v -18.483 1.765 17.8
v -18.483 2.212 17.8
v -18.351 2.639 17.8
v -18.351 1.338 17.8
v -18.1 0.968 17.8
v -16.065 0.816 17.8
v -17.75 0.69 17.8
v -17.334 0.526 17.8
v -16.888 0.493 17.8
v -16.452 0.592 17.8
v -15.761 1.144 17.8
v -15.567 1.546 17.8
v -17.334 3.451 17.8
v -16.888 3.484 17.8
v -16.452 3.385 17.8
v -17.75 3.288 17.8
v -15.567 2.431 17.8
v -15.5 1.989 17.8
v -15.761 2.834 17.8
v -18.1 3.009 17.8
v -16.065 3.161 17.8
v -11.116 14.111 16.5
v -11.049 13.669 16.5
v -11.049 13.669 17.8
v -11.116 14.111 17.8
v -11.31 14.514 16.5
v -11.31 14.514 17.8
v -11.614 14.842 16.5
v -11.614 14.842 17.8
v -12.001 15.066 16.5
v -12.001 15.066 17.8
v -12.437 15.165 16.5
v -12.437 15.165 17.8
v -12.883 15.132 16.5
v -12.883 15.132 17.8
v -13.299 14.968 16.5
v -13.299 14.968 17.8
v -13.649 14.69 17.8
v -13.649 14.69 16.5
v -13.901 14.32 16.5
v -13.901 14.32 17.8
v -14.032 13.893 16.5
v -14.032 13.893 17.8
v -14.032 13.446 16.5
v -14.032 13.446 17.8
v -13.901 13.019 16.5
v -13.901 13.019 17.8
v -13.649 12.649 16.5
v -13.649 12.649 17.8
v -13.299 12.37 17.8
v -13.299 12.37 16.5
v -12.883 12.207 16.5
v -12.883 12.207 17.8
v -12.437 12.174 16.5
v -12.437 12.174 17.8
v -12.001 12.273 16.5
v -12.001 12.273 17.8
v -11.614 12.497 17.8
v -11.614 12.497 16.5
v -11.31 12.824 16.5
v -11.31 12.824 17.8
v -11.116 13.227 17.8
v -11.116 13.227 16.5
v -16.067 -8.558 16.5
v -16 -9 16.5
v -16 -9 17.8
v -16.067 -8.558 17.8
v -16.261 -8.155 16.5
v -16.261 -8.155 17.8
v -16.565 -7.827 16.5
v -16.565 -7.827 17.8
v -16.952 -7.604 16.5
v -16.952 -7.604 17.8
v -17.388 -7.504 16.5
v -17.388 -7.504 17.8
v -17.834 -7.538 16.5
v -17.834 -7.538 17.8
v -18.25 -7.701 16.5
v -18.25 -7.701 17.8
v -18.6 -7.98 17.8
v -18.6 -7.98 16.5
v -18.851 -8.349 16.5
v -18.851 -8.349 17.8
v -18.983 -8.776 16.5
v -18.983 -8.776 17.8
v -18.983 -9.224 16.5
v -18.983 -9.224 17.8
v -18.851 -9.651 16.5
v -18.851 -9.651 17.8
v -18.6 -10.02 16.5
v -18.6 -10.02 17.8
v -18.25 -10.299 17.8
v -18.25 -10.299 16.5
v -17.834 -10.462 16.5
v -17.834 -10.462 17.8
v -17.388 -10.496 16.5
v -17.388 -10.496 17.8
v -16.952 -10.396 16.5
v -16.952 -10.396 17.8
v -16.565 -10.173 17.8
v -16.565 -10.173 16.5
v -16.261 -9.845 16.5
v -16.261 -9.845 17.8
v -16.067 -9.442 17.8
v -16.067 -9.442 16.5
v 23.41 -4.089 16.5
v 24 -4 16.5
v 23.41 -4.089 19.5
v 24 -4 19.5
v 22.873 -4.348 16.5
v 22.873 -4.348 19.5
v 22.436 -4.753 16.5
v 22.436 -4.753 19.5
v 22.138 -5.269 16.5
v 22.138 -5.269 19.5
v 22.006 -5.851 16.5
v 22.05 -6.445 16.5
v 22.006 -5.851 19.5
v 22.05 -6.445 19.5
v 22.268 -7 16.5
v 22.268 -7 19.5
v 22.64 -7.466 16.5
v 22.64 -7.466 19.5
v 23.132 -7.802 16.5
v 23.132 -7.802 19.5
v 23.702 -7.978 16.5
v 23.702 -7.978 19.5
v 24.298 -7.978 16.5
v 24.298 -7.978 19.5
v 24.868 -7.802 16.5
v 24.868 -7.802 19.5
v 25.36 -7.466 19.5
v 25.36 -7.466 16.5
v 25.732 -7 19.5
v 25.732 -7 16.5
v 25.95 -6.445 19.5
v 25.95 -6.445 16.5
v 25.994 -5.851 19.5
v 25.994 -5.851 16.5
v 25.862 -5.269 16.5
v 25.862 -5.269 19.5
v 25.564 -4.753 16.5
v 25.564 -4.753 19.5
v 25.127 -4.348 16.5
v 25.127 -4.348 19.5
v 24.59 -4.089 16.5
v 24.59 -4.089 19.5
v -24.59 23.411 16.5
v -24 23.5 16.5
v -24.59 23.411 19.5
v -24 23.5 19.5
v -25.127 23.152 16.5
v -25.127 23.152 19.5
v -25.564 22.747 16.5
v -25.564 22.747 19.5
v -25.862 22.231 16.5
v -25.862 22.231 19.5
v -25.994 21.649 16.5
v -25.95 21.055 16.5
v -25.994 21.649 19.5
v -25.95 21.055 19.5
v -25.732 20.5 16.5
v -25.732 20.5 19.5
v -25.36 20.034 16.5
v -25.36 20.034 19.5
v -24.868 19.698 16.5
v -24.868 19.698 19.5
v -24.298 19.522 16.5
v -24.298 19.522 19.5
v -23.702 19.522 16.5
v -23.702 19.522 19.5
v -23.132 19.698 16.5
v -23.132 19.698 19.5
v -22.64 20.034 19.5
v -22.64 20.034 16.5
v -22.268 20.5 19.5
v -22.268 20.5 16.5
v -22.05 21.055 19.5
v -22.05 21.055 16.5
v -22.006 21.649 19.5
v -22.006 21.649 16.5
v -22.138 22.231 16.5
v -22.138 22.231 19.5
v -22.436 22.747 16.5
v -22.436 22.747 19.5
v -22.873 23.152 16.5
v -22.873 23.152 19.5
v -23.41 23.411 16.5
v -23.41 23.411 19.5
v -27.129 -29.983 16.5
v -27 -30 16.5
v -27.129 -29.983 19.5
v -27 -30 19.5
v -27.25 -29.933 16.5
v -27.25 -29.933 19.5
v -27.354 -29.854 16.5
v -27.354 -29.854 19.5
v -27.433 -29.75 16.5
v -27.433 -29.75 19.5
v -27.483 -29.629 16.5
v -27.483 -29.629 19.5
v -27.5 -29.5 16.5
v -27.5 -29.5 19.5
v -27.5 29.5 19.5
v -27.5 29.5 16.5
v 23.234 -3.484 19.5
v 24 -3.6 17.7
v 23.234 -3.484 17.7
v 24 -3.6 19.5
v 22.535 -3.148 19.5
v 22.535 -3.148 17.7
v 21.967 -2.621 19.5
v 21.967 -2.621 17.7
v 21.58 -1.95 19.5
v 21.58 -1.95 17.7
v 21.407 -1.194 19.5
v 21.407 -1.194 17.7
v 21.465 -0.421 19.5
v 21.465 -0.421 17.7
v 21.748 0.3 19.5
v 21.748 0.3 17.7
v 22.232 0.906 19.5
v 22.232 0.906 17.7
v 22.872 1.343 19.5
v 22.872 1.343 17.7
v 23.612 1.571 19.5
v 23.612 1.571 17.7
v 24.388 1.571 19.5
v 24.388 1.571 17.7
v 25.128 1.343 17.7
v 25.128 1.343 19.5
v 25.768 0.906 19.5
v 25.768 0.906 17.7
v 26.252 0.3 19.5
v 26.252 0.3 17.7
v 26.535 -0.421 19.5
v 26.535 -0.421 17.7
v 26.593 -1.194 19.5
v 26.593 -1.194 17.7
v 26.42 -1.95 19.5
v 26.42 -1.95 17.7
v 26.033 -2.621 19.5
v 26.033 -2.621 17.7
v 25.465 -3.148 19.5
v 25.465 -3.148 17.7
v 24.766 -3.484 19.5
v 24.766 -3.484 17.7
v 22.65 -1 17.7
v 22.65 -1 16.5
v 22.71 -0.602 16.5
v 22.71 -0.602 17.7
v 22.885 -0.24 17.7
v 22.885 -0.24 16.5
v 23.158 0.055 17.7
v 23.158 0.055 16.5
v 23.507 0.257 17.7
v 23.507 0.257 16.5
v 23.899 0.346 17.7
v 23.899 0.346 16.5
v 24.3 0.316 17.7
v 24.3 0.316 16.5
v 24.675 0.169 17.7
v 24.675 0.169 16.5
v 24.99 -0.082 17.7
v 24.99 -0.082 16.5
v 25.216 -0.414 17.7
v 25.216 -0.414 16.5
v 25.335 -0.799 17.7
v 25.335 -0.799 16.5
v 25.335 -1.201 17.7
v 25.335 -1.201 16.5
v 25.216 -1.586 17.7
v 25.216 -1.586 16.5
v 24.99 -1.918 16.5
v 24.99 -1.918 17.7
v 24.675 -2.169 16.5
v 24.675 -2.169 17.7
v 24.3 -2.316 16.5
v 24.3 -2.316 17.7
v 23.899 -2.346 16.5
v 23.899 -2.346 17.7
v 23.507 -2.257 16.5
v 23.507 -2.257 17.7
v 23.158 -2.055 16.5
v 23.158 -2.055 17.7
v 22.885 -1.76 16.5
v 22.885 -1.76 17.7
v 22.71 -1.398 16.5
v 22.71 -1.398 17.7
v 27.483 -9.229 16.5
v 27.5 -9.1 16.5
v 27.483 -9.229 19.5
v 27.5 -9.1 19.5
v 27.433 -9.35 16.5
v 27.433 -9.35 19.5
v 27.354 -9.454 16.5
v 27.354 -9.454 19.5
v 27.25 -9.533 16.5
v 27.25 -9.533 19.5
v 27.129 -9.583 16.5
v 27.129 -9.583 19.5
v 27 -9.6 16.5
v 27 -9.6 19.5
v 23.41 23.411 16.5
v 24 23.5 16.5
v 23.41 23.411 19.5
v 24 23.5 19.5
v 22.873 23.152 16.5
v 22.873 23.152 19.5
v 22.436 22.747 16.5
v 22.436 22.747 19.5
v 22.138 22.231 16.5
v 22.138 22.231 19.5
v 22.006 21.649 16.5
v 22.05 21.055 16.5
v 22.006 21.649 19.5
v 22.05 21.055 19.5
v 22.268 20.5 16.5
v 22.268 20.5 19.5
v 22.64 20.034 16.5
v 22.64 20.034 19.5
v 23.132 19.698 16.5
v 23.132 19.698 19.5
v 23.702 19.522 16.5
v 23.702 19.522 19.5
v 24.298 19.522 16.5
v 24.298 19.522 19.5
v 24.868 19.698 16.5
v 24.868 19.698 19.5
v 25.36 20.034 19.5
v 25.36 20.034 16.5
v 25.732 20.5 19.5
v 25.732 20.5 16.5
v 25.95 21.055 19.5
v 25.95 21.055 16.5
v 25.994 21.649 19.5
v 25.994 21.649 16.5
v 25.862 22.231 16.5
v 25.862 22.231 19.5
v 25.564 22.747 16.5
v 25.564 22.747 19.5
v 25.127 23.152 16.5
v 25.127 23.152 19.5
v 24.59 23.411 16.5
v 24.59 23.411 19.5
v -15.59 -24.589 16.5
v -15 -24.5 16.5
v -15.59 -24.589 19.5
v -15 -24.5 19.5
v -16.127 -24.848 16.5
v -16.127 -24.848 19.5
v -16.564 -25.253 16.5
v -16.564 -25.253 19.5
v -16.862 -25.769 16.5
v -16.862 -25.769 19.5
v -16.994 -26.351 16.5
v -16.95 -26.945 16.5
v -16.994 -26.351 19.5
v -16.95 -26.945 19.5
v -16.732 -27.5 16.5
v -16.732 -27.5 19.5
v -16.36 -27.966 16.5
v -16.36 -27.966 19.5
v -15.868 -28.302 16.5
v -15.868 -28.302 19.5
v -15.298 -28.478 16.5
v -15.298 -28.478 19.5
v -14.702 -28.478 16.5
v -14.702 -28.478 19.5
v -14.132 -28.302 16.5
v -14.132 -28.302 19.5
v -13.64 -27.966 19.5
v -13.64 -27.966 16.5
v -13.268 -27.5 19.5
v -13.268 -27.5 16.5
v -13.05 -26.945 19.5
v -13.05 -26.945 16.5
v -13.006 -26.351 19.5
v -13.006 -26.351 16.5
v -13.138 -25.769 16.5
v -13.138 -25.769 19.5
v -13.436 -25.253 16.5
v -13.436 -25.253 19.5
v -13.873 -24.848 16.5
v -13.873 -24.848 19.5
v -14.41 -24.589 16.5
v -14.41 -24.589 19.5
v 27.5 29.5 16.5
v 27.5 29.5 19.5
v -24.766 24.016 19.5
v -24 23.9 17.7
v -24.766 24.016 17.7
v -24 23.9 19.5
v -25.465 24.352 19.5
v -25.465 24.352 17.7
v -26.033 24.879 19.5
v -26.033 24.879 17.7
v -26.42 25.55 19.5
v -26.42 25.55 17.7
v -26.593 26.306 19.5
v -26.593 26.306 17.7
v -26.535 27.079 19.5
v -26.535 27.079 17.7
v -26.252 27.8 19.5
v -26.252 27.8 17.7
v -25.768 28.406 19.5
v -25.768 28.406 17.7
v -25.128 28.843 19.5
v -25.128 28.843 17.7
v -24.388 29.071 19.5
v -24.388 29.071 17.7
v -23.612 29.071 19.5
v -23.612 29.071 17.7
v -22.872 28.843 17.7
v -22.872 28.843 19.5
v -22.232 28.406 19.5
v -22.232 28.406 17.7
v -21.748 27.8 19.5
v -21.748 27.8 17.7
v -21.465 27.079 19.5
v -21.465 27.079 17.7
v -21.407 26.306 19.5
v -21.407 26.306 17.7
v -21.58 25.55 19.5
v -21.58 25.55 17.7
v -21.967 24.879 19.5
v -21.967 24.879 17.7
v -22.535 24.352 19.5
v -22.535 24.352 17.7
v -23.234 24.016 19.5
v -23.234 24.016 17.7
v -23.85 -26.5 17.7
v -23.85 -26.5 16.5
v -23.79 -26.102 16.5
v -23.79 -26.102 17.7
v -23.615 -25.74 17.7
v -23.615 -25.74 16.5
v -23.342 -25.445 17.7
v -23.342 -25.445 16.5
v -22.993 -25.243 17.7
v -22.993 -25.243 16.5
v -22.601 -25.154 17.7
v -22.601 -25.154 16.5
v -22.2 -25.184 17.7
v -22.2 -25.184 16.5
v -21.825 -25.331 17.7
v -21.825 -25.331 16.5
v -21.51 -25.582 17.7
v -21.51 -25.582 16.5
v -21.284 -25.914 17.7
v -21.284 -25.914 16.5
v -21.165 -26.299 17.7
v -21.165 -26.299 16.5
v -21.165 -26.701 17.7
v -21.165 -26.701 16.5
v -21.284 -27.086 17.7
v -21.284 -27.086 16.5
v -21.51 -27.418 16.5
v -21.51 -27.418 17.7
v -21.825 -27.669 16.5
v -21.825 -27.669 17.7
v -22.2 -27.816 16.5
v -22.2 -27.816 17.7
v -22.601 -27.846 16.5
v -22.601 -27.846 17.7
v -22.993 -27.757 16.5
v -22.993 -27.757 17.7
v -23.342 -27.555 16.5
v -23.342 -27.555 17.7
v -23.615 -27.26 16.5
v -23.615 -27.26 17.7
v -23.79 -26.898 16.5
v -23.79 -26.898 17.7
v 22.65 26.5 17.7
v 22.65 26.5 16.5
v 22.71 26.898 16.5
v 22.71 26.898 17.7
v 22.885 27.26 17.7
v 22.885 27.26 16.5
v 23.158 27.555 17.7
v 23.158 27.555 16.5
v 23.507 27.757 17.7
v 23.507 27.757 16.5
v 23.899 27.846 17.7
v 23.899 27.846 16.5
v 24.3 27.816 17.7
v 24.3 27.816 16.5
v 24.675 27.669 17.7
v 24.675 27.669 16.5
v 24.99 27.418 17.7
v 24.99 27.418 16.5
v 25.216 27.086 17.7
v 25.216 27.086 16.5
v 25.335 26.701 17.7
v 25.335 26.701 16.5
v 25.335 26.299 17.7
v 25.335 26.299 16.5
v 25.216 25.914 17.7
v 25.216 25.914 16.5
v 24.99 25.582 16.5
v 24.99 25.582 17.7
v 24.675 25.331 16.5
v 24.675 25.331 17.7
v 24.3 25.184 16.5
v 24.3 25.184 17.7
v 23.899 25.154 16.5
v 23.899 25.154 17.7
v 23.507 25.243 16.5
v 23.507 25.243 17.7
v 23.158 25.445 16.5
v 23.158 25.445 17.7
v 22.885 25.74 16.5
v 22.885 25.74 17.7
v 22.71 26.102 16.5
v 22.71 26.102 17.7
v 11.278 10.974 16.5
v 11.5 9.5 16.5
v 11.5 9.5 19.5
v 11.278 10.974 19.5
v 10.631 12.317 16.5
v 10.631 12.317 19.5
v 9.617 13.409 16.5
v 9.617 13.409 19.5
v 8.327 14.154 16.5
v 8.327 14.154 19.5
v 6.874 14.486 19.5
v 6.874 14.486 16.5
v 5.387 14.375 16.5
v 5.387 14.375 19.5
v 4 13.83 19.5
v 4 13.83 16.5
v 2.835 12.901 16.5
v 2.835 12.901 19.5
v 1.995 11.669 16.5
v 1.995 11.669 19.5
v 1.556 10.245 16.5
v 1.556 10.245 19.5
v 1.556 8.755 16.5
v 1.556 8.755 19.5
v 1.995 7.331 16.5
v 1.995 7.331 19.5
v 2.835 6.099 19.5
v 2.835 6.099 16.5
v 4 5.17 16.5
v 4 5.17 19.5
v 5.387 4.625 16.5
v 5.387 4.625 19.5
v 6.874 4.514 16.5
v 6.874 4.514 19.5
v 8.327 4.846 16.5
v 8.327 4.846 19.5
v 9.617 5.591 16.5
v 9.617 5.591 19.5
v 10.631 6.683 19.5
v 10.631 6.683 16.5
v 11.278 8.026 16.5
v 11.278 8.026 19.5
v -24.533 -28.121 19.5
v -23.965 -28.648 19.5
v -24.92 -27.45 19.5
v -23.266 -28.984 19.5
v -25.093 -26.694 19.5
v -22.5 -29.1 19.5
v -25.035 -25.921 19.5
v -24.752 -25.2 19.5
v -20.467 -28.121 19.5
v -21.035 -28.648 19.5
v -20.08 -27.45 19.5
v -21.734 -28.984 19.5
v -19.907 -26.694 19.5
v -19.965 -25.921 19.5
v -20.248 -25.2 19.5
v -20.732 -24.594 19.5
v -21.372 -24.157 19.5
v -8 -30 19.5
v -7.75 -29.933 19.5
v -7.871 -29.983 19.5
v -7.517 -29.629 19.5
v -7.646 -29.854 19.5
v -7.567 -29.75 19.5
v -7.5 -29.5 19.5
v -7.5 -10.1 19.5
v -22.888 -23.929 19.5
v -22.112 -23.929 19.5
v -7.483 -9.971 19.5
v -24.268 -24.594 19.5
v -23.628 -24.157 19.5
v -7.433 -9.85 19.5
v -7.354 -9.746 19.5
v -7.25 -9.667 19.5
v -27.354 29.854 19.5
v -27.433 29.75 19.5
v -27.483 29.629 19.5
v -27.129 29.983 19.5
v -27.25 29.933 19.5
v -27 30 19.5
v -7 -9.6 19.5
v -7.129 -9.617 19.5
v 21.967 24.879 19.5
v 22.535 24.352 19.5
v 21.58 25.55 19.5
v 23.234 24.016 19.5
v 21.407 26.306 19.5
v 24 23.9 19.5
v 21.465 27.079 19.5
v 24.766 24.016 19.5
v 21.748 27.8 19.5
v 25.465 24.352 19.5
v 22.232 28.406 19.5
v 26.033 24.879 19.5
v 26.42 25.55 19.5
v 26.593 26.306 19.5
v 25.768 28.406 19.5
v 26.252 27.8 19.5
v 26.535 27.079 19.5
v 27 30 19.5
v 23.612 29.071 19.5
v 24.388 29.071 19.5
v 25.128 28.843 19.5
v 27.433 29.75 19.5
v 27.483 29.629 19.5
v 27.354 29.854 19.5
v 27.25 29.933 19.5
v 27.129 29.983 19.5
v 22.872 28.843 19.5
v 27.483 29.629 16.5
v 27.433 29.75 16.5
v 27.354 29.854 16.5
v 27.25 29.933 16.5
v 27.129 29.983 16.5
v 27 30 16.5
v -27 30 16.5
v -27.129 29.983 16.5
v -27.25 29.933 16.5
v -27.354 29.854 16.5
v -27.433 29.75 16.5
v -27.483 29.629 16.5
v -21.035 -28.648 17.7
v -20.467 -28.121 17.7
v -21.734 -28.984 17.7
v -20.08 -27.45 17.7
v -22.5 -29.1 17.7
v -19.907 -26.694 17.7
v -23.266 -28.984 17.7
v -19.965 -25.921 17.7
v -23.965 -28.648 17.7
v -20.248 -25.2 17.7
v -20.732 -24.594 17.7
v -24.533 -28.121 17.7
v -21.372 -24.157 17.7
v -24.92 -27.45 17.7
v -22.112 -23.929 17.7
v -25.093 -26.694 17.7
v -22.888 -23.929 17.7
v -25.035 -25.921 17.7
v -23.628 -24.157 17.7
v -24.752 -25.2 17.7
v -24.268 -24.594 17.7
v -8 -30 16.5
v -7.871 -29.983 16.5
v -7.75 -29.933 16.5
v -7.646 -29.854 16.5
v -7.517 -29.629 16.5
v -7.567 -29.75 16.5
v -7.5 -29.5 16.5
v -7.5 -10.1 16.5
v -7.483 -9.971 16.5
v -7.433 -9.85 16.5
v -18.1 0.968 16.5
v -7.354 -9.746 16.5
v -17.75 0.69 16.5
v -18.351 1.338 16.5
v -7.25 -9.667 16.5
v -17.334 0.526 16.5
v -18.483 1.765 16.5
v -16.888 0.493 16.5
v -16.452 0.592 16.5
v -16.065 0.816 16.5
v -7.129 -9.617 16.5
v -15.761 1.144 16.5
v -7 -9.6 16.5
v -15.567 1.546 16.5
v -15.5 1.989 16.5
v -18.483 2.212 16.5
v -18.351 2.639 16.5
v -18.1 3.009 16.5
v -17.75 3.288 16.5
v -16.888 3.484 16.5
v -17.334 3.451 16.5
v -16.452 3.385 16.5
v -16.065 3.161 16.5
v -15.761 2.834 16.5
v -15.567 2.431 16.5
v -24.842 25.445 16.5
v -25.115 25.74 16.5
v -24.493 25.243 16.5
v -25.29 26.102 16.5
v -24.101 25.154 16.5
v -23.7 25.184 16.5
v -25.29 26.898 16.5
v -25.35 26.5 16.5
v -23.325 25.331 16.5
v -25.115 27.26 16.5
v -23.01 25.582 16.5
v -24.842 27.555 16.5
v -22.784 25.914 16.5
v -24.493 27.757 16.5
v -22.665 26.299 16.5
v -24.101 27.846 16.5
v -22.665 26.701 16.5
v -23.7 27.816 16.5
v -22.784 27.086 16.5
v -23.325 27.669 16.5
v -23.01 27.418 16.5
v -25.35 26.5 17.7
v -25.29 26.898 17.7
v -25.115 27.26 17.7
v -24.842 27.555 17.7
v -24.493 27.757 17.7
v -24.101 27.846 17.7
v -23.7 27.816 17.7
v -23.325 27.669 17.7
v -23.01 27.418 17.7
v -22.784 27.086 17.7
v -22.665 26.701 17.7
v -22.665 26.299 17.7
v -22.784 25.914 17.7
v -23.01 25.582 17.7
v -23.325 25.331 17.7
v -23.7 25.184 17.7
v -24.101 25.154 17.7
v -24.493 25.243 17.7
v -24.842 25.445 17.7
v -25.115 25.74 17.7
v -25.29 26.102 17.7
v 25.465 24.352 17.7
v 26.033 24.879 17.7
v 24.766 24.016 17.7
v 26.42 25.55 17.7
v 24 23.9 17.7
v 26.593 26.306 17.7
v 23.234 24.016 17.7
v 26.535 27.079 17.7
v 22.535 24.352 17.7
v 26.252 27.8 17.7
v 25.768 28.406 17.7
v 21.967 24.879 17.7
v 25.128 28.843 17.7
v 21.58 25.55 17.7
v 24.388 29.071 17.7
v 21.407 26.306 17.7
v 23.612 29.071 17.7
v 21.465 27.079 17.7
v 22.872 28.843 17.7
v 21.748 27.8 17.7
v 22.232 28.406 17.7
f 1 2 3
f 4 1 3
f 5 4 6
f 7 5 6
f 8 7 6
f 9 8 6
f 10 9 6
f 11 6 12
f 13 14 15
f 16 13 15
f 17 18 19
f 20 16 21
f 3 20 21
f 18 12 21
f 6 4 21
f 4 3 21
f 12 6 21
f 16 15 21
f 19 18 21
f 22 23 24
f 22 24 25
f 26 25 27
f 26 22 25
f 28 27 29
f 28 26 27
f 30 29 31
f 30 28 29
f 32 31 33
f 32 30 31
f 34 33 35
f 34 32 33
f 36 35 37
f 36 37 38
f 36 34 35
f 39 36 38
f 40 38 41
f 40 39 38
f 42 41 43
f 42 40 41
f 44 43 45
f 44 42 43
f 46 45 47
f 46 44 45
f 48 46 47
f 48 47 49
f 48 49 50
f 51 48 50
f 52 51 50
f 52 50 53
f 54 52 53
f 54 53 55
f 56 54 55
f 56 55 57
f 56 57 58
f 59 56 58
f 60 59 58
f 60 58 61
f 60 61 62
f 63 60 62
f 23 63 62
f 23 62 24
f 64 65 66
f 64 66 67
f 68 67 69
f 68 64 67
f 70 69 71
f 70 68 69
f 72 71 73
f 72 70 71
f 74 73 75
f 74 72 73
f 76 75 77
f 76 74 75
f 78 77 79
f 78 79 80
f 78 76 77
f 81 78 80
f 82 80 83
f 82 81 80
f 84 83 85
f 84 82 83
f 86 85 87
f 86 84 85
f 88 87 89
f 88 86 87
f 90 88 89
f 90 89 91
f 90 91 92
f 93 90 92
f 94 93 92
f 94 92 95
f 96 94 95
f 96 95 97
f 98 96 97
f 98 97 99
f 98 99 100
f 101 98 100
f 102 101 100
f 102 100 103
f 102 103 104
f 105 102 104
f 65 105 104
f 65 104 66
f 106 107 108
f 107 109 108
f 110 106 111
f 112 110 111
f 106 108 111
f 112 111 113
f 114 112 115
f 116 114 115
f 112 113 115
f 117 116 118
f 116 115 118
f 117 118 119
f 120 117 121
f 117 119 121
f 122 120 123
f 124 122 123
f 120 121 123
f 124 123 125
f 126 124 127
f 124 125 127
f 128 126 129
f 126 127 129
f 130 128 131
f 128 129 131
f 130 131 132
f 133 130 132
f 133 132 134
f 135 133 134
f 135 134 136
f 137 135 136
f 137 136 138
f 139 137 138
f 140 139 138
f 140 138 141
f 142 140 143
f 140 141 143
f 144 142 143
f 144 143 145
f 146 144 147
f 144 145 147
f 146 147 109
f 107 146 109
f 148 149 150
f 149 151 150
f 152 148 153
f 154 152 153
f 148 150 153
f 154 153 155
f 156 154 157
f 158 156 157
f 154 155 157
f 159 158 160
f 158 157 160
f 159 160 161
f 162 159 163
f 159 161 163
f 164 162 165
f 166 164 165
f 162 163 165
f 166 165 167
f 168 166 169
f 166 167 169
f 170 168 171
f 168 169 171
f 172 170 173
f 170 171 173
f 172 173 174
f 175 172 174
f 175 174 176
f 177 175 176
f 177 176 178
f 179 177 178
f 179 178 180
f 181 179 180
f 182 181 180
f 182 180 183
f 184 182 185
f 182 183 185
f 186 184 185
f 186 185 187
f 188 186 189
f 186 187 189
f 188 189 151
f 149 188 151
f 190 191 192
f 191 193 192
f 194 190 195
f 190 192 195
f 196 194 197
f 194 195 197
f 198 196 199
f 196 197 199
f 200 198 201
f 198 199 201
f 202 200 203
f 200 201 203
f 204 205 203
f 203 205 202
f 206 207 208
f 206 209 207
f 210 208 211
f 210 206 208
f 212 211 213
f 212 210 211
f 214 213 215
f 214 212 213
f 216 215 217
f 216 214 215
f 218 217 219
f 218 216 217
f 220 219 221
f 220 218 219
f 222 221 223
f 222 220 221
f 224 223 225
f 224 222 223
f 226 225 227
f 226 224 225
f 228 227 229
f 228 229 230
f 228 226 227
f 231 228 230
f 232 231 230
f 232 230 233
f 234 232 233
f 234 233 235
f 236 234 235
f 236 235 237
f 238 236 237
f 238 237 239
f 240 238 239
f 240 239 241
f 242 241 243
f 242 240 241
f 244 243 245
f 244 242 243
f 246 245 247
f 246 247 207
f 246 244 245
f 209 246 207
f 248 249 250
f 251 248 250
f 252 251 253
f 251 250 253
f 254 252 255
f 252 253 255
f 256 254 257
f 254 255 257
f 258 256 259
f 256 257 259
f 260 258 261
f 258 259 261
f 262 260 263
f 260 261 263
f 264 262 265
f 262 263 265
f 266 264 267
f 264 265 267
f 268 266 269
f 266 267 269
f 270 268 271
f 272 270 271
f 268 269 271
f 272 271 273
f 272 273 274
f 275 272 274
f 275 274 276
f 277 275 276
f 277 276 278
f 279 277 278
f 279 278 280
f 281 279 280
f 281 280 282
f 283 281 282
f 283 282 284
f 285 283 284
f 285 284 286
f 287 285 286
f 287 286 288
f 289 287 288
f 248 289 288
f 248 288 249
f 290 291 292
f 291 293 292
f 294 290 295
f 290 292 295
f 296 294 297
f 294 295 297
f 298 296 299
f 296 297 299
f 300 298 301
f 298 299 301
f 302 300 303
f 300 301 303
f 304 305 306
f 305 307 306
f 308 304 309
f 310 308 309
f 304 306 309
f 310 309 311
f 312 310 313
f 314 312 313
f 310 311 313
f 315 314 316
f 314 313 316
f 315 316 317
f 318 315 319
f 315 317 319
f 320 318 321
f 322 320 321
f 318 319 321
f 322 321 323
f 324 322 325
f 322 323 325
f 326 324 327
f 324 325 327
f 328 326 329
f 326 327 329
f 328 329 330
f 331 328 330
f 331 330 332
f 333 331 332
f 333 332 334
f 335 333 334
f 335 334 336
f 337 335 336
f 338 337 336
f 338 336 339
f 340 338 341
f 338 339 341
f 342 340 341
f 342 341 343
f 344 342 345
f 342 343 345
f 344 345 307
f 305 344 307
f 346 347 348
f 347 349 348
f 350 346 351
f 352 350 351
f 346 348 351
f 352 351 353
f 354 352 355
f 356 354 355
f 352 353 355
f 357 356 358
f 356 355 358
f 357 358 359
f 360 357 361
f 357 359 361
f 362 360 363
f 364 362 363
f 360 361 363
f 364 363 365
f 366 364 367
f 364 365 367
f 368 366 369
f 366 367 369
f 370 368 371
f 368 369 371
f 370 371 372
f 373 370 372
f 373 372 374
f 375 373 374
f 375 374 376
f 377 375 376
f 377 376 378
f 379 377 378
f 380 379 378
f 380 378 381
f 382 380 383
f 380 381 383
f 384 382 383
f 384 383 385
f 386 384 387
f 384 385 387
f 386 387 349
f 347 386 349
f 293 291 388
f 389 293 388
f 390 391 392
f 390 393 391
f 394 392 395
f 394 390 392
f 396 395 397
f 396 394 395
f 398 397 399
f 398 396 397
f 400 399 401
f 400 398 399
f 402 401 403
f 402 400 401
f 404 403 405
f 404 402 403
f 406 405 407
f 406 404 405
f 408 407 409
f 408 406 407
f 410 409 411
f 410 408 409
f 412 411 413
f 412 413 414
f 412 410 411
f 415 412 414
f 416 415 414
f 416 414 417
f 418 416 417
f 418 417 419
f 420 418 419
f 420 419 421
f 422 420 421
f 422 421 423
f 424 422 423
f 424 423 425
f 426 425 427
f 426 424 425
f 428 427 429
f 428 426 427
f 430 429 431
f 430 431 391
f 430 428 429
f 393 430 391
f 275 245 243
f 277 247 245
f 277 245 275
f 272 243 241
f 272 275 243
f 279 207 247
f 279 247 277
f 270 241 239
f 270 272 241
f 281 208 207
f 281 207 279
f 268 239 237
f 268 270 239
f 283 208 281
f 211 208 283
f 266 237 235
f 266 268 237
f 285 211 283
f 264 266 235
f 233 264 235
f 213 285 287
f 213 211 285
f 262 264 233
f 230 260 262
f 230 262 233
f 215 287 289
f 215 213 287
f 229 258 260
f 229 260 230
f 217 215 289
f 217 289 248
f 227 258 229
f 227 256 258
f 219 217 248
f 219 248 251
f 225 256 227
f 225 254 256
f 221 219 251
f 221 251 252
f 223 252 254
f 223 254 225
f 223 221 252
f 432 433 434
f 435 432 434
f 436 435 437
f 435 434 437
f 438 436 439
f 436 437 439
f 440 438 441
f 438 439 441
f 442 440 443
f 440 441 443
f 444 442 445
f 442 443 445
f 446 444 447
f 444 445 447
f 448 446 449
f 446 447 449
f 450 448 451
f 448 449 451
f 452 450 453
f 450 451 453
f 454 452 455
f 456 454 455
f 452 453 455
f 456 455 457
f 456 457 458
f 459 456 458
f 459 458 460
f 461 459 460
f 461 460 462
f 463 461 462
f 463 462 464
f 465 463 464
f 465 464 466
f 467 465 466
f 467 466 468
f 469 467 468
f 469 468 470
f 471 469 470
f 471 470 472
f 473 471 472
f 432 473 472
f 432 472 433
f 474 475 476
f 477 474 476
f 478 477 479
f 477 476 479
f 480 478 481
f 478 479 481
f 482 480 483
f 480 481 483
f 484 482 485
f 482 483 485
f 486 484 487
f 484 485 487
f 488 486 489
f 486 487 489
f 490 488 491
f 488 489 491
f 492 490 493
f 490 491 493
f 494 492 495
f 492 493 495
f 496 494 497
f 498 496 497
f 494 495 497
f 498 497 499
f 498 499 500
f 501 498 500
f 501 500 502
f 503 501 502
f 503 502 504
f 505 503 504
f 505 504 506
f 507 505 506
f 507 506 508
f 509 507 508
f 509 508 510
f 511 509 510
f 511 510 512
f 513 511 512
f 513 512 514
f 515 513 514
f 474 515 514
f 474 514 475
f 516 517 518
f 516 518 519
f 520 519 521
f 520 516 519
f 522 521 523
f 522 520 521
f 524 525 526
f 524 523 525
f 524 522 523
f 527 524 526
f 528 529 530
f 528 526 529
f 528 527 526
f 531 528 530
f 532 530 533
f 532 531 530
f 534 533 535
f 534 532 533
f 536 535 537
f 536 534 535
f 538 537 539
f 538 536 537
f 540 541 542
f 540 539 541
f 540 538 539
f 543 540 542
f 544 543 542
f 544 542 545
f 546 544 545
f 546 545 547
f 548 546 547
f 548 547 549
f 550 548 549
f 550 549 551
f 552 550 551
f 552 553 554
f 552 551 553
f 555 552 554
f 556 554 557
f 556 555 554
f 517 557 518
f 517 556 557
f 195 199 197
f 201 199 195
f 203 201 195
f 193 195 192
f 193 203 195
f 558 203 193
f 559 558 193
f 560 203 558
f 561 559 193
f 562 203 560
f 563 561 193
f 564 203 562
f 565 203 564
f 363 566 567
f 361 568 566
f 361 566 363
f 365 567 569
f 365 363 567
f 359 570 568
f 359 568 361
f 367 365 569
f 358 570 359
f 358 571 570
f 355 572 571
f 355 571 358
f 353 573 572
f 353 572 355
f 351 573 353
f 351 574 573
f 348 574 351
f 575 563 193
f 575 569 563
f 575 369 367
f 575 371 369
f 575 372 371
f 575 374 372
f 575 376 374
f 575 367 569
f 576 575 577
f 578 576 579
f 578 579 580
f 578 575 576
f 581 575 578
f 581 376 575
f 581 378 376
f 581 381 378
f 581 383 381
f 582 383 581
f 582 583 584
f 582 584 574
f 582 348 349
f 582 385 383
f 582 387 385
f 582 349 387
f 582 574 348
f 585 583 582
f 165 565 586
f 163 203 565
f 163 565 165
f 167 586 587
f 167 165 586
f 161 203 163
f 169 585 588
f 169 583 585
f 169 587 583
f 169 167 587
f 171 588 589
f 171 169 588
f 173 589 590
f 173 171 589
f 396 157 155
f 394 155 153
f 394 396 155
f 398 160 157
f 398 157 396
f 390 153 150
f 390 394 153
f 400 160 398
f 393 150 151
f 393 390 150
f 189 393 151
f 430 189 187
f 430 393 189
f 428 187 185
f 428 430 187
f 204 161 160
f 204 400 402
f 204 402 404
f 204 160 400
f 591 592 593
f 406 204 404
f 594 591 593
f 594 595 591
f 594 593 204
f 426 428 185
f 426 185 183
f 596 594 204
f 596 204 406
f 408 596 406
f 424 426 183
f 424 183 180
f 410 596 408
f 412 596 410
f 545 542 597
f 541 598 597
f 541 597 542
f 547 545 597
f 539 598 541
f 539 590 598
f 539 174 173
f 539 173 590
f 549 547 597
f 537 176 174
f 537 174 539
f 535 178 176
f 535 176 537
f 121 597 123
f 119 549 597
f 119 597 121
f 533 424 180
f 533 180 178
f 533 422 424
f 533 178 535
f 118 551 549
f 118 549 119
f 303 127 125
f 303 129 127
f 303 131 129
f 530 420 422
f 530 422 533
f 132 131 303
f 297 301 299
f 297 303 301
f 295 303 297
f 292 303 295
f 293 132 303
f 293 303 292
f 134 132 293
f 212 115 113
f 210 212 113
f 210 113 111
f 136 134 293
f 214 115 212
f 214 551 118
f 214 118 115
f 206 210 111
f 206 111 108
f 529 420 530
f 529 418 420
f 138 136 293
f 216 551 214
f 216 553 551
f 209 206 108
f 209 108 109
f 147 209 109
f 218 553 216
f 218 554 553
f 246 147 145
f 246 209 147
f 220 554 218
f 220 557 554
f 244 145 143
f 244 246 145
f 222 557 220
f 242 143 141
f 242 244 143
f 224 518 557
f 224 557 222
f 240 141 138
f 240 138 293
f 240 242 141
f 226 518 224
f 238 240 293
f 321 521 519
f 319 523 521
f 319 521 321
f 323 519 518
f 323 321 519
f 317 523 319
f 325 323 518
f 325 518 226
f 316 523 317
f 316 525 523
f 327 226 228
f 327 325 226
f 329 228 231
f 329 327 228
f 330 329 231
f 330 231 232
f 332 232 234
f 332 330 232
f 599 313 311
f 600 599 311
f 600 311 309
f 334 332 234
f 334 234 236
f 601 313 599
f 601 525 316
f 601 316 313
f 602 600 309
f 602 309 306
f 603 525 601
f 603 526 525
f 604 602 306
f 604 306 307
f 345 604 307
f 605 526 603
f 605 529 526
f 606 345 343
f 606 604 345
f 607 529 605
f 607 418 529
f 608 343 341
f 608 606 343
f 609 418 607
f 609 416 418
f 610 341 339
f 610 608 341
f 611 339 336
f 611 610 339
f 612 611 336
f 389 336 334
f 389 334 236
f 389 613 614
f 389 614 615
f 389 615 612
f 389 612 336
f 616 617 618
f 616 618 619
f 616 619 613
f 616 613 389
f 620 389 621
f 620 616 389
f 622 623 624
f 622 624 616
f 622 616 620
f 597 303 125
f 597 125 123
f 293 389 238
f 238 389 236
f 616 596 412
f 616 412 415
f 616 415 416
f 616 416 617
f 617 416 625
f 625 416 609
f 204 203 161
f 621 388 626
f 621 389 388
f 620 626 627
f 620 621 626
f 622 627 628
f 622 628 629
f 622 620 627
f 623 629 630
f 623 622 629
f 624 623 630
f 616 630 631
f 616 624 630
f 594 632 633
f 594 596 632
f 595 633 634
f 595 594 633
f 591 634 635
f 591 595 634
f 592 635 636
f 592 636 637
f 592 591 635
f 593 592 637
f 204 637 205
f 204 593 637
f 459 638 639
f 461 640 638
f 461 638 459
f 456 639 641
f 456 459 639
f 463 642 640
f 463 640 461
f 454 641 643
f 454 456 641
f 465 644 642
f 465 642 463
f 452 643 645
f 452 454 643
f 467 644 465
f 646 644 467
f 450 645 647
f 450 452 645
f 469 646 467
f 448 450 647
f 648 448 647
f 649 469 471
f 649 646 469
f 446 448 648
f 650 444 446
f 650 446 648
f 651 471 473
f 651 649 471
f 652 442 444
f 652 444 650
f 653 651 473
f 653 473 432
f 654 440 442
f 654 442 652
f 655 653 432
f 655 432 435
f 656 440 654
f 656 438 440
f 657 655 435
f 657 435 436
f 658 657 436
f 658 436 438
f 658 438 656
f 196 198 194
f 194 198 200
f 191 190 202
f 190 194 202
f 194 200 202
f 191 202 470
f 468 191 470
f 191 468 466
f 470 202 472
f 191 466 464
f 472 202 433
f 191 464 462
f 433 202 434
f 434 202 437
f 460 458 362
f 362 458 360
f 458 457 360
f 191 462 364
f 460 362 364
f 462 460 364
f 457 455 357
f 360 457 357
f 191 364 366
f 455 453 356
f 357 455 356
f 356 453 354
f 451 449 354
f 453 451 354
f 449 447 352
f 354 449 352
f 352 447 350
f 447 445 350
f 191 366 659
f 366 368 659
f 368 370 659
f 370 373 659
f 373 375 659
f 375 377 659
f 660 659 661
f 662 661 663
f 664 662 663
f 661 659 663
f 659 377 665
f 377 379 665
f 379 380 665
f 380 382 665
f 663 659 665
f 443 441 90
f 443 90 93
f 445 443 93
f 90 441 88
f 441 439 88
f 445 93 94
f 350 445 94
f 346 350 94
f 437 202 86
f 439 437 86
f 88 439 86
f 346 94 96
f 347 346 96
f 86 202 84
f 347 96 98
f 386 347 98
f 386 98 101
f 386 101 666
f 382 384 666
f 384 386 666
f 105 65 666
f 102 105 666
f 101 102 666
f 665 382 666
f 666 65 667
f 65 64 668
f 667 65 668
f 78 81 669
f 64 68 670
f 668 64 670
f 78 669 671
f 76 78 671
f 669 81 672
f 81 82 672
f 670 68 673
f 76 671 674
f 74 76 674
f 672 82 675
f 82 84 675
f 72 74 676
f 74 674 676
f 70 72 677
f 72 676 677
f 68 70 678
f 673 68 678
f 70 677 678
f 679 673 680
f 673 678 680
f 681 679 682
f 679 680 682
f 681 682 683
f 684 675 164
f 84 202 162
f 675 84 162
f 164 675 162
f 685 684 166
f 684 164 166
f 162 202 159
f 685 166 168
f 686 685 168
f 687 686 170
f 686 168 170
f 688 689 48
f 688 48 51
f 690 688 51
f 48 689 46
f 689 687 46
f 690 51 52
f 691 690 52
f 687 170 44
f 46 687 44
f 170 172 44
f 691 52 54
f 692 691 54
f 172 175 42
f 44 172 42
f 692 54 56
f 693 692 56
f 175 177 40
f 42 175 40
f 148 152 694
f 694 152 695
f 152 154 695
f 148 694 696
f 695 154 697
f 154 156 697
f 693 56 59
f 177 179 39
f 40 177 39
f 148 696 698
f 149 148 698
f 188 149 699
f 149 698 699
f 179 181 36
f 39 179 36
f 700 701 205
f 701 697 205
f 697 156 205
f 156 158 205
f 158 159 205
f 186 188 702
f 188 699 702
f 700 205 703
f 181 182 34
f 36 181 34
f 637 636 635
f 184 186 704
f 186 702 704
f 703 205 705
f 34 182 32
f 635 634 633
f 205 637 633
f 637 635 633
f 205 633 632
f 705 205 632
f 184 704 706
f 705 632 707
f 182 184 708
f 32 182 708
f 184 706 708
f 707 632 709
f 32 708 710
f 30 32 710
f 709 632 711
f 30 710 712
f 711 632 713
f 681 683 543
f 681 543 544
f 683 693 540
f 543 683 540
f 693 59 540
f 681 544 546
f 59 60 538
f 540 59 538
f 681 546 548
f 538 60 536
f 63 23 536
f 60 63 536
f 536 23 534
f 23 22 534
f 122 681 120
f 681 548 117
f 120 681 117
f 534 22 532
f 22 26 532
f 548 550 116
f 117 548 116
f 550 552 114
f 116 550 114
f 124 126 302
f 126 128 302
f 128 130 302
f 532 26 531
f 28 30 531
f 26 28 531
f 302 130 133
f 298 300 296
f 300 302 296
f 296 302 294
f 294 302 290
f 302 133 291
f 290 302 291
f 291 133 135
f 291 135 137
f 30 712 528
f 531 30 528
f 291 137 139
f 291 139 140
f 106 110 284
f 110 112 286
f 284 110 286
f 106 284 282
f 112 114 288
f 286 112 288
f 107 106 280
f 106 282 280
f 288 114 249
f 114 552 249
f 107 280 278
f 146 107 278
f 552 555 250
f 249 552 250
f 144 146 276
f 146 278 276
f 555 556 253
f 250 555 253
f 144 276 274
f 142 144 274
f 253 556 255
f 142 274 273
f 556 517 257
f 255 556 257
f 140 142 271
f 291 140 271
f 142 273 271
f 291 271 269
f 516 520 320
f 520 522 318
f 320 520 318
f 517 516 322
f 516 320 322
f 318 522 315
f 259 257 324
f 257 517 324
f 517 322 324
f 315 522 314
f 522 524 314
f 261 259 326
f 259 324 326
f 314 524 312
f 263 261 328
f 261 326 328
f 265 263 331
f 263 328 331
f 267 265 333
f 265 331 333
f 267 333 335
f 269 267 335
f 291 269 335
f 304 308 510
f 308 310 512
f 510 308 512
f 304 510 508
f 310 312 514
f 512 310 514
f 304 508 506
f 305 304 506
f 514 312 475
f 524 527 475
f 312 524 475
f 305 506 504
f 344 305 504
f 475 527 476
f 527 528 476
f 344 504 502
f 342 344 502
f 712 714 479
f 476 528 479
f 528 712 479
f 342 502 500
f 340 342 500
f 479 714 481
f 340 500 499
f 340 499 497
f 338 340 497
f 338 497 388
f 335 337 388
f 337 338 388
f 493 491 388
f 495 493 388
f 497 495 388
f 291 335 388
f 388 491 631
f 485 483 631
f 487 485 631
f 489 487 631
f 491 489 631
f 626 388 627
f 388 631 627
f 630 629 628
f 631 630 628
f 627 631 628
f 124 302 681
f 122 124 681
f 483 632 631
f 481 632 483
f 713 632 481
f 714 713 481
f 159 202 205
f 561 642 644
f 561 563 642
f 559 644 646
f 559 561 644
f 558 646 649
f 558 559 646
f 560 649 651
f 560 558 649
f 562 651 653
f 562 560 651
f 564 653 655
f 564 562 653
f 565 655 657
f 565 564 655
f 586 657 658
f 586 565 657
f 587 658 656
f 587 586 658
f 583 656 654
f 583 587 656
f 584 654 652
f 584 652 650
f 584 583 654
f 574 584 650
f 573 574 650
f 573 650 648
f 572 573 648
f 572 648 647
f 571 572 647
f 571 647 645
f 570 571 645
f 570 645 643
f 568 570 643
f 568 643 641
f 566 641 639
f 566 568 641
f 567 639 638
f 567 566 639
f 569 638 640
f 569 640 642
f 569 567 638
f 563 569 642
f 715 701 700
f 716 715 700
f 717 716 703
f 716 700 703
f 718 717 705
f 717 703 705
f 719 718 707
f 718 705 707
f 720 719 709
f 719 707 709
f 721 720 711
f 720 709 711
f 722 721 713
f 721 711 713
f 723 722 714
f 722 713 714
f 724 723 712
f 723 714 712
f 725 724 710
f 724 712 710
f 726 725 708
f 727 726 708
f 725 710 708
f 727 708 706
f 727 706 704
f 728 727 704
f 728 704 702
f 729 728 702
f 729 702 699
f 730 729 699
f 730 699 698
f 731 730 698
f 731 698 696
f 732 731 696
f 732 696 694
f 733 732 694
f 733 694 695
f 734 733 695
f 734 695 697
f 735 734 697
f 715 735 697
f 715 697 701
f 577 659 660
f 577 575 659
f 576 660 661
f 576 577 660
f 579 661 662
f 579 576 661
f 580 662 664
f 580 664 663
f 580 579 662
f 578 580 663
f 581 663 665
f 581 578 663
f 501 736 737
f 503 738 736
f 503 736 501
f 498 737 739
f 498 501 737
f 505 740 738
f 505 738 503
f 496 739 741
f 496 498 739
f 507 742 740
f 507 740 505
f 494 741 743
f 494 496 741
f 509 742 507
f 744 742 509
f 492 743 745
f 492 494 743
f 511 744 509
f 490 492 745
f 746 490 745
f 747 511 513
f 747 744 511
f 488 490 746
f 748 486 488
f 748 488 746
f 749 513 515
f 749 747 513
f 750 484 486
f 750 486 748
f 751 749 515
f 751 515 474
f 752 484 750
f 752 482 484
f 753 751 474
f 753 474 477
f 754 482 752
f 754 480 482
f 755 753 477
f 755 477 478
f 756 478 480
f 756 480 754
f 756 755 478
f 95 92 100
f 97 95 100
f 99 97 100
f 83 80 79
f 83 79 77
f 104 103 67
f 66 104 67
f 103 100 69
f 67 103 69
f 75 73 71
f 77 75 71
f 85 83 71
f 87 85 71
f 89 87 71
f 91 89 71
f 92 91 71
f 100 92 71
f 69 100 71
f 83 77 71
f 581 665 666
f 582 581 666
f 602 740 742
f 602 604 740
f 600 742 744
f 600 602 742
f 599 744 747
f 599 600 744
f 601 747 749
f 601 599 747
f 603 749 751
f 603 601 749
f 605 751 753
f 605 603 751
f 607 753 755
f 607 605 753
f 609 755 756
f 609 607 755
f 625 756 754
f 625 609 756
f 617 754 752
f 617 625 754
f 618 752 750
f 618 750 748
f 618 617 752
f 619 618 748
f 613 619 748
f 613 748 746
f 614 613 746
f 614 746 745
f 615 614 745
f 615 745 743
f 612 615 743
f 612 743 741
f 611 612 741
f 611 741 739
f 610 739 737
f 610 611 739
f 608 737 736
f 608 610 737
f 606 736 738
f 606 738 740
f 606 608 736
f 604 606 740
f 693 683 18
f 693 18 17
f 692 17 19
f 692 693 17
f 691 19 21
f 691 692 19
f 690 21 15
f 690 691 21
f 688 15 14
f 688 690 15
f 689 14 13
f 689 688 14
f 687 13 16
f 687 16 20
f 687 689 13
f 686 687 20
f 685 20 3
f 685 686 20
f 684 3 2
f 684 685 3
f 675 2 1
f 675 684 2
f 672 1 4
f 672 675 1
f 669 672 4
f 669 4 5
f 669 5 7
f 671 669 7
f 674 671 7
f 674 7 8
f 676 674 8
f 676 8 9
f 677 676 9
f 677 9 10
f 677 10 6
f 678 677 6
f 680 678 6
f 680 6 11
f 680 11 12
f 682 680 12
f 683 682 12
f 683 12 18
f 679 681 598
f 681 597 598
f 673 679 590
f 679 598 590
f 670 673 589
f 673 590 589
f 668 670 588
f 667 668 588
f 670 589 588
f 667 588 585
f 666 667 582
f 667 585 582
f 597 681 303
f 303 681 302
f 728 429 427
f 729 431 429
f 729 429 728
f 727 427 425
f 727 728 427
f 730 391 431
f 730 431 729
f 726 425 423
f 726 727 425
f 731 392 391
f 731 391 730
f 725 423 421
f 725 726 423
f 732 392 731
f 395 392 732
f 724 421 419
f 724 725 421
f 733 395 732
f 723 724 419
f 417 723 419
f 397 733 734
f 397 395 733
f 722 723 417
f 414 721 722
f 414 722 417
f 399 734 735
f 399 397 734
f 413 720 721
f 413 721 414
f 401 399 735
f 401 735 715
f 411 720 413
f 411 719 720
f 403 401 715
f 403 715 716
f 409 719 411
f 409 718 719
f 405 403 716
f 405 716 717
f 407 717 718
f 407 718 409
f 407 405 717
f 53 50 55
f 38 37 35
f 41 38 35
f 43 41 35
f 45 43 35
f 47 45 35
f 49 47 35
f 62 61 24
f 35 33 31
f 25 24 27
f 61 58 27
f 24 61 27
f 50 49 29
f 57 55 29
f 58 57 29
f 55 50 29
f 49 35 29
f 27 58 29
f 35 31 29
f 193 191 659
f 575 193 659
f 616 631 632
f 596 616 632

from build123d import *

# Parameters (mm, degrees)
SKETCH_1_W                     = 55
SKETCH_1_H                     = 60
EXTRUDE_1_DEPTH                = 16.5
HOLE_WIZARD_3_6_3_6_1_D        = 3.6
HOLE_WIZARD_3_6_3_6_1_DEPTH    = 25
HOLE_WIZARD_3_6_3_6_1_TIP      = 1.081549114
HOLE_WIZARD_M2_5_1_D           = 2.05
HOLE_WIZARD_M2_5_1_DEPTH       = 14
HOLE_WIZARD_M2_5_1_TIP         = 0.615882135
SKETCH_8_W                     = 35
SKETCH_8_H                     = 20.4
CUT_EXTRUDE_1_DEPTH            = 44.914690025
CUT_EXTRUDE_START              = 2.5
SKETCH_9_W                     = 20
SKETCH_9_H                     = 6
CUT_EXTRUDE_2_DEPTH            = 42.414690025
SHELL_START                    = 1.8
SHELL_1_DEPTH                  = 14.7
EXTRUDE_2_DEPTH                = 3
HOLE_WIZARD_1_AT_2_COUNT       = 2
HOLE_WIZARD_1_AT_2_PITCH       = 48
HOLE_WIZARD_1_AT_3_COUNT       = 2
HOLE_WIZARD_1_AT_3_PITCH       = 27.5
HOLE_WIZARD_1_AT_4_COUNT       = 2
HOLE_WIZARD_1_AT_4_PITCH       = 70.507091842
CUT_EXTRUDE_START_2            = -1.5
SKETCH_15_R                    = 5
SKETCH_15_R_2                  = 1.5
CUT_EXTRUDE_3_DEPTH            = 17.5
SKETCH_16_R                    = 3
CUT_EXTRUDE_4_DEPTH            = 12
CUT_EXTRUDE_5_DEPTH            = 45.379499772
CUT_EXTRUDE_5_DEPTH_BACK       = 45.379499772
SKETCH_17_R                    = 5
FILLET_1_R                     = 0.5
FILLET_2_R                     = 0.5
SKETCH_20_W                    = 2
SKETCH_20_H                    = 3
HOLE_WIZARD_4_0_4_1_AT_2_COUNT = 2
HOLE_WIZARD_4_0_4_1_AT_2_PITCH = 27.5
HOLE_WIZARD_4_0_4_1_AT_3_COUNT = 2
HOLE_WIZARD_4_0_4_1_AT_3_PITCH = 61.846584384
HOLE_WIZARD_4_0_4_1_AT_4_COUNT = 2
HOLE_WIZARD_4_0_4_1_AT_4_PITCH = 48
HOLE_WIZARD_2_7_2_7_1_D        = 2.7


# Read off the part's stored shape, not the designer's step: 抽壳1
with BuildPart() as part:
    # 草图1 → 凸台-拉伸1 (new body)
    with BuildSketch(Plane.XY):
        Rectangle(SKETCH_1_W, SKETCH_1_H)
    extrude(amount=EXTRUDE_1_DEPTH)

    # Ø3.6 (3.6) 直径孔1
    with Locations(Plane.XY.offset(16.5)):
        with Locations((-24, 21.5), (24, 21.5), (24, -6), (-15, -26.5)):
            Hole(HOLE_WIZARD_3_6_3_6_1_D / 2, depth=HOLE_WIZARD_3_6_3_6_1_DEPTH)
            with Locations((0, 0, -(HOLE_WIZARD_3_6_3_6_1_DEPTH + HOLE_WIZARD_3_6_3_6_1_TIP / 2))):  # 118° drill point
                Cone(0, HOLE_WIZARD_3_6_3_6_1_D / 2, HOLE_WIZARD_3_6_3_6_1_TIP, mode=Mode.SUBTRACT)

    # M2.5 螺纹孔1
    with Locations(Plane.XY.offset(16.5)):
        with Locations((-24, 26.5), (24, 26.5), (24, -1), (-22.5, -26.5)):
            Hole(HOLE_WIZARD_M2_5_1_D / 2, depth=HOLE_WIZARD_M2_5_1_DEPTH)
            with Locations((0, 0, -(HOLE_WIZARD_M2_5_1_DEPTH + HOLE_WIZARD_M2_5_1_TIP / 2))):  # 118° drill point
                Cone(0, HOLE_WIZARD_M2_5_1_D / 2, HOLE_WIZARD_M2_5_1_TIP, mode=Mode.SUBTRACT)

    # 草图8 → 切除-拉伸1 (cut, through all)
    with BuildSketch(Plane.XY.offset(16.5)):
        with Locations((10, -19.8)):
            Rectangle(SKETCH_8_W, SKETCH_8_H)
    extrude(amount=-CUT_EXTRUDE_1_DEPTH, mode=Mode.SUBTRACT)

    # 草图9 → 切除-拉伸2 (cut, through all)
    with BuildSketch(Plane(origin=(0, 0, 16.5), x_dir=(-1, 0, 0), z_dir=(0, 0, -1)).offset(CUT_EXTRUDE_START)):
        with Locations((17.5, -27)):
            Rectangle(SKETCH_9_W, SKETCH_9_H)
    extrude(amount=CUT_EXTRUDE_2_DEPTH, mode=Mode.SUBTRACT)

    # 抽壳1 outline → 抽壳1 (cut)
    with BuildSketch(Plane.XY.offset(SHELL_START)):
        with BuildLine():
            ThreePointArc((-21.743758657, 28.2), (-21.182110509, 26.299690696), (-22.006919283, 24.4979375))
            ThreePointArc((-22.006919283, 24.4979375), (-20.910890356, 19.651378458), (-25.7, 18.326673669))
            Line((-25.7, 18.326673669), (-25.7, -22.2))
            Line((-25.7, -22.2), (-9.3, -22.2))
            Line((-9.3, -22.2), (-9.3, -7.8))
            Line((-9.3, -7.8), (20.882308546, -7.8))
            ThreePointArc((20.882308546, -7.8), (20.494996561, -5.178446051), (22.006919283, -3.0020625))
            ThreePointArc((22.006919283, -3.0020625), (21.865811165, 0.8509087), (25.7, 1.256241343))
            Line((25.7, 1.256241343), (25.7, 18.326673669))
            ThreePointArc((25.7, 18.326673669), (20.910890356, 19.651378458), (22.006919283, 24.4979375))
            ThreePointArc((22.006919283, 24.4979375), (21.182110509, 26.299690696), (21.743758657, 28.2))
            Line((21.743758657, 28.2), (-21.743758657, 28.2))
        make_face()
    extrude(amount=SHELL_1_DEPTH, mode=Mode.SUBTRACT)


with BuildPart() as body_2:
    # 草图10 → 凸台-拉伸2 (new body)
    with BuildSketch(Plane.XY.offset(16.5)):
        Polygon((-27.5, -30), (-7.5, -30), (-7.5, -9.6), (27.5, -9.6), (27.5, 30), (-27.5, 30), align=None)
    extrude(amount=EXTRUDE_2_DEPTH)


with BuildPart() as hole_wizard_1_tool:
    # 草图13 → 打孔尺寸(%根据)内六角圆柱头螺钉的类型1 (revolve)
    with BuildSketch(Plane(origin=(24, 26.5, 19.5), x_dir=(0, -1, 0), z_dir=(1, 0, 0))):
        Polygon((0, 0), (0, 19.5), (1.1, 19.5), (1.1, 1.8), (2.6, 1.8), (2.6, 0), align=None)
    hole_wizard_1 = revolve(axis=Axis((24, 26.5, 25.85), (0, 0, -1)))


with BuildPart() as part_1:
    add(part.part)

    # 打孔尺寸(%根据)内六角圆柱头螺钉的类型1: cut by hole_wizard_1_tool
    add(hole_wizard_1_tool.part, mode=Mode.SUBTRACT)


with BuildPart() as body_2_1:
    add(body_2.part)

    # 打孔尺寸(%根据)内六角圆柱头螺钉的类型1: cut by hole_wizard_1_tool
    add(hole_wizard_1_tool.part, mode=Mode.SUBTRACT)


with BuildPart() as hole_wizard_1_at_2_tool:
    # 打孔尺寸(%根据)内六角圆柱头螺钉的类型1 at 2: 打孔尺寸(%根据)内六角圆柱头螺钉的类型1 ×2
    with Locations(*[(-i * HOLE_WIZARD_1_AT_2_PITCH, 0, 0) for i in range(1, HOLE_WIZARD_1_AT_2_COUNT)]):
        add(hole_wizard_1)


with BuildPart() as part_2:
    add(part_1.part)

    # 打孔尺寸(%根据)内六角圆柱头螺钉的类型1 at 2: cut by hole_wizard_1_at_2_tool
    add(hole_wizard_1_at_2_tool.part, mode=Mode.SUBTRACT)


with BuildPart() as body_2_2:
    add(body_2_1.part)

    # 打孔尺寸(%根据)内六角圆柱头螺钉的类型1 at 2: cut by hole_wizard_1_at_2_tool
    add(hole_wizard_1_at_2_tool.part, mode=Mode.SUBTRACT)


with BuildPart() as hole_wizard_1_at_3_tool:
    # 打孔尺寸(%根据)内六角圆柱头螺钉的类型1 at 3: 打孔尺寸(%根据)内六角圆柱头螺钉的类型1 ×2
    with Locations(*[(0, -i * HOLE_WIZARD_1_AT_3_PITCH, 0) for i in range(1, HOLE_WIZARD_1_AT_3_COUNT)]):
        add(hole_wizard_1)


with BuildPart() as part_3:
    add(part_2.part)

    # 打孔尺寸(%根据)内六角圆柱头螺钉的类型1 at 3: cut by hole_wizard_1_at_3_tool
    add(hole_wizard_1_at_3_tool.part, mode=Mode.SUBTRACT)


with BuildPart() as body_2_3:
    add(body_2_2.part)

    # 打孔尺寸(%根据)内六角圆柱头螺钉的类型1 at 3: cut by hole_wizard_1_at_3_tool
    add(hole_wizard_1_at_3_tool.part, mode=Mode.SUBTRACT)


with BuildPart() as hole_wizard_1_at_4_tool:
    # 打孔尺寸(%根据)内六角圆柱头螺钉的类型1 at 4: 打孔尺寸(%根据)内六角圆柱头螺钉的类型1 ×2
    with Locations(*[Vector(-0.6595081258531857, -0.7516974337681476, 0) * (i * HOLE_WIZARD_1_AT_4_PITCH) for i in range(1, HOLE_WIZARD_1_AT_4_COUNT)]):
        add(hole_wizard_1)


with BuildPart() as part_4:
    add(part_3.part)

    # 打孔尺寸(%根据)内六角圆柱头螺钉的类型1 at 4: cut by hole_wizard_1_at_4_tool
    add(hole_wizard_1_at_4_tool.part, mode=Mode.SUBTRACT)


with BuildPart() as body_2_4:
    add(body_2_3.part)

    # 打孔尺寸(%根据)内六角圆柱头螺钉的类型1 at 4: cut by hole_wizard_1_at_4_tool
    add(hole_wizard_1_at_4_tool.part, mode=Mode.SUBTRACT)


with BuildPart() as cut_extrude_3_tool:
    # 草图15 → 切除-拉伸3 (new body)
    with BuildSketch(Plane.XY.offset(1.8).offset(CUT_EXTRUDE_START_2)):
        with Locations((6.5, 9.5)):
            Circle(SKETCH_15_R)
        with Locations((-12.549056621, 13.669345493)):
            Circle(SKETCH_15_R_2)
        with Locations((-17, 1.988630488)):
            Circle(SKETCH_15_R_2)
        with Locations((-17.5, -9)):
            Circle(SKETCH_15_R_2)
    extrude(amount=CUT_EXTRUDE_3_DEPTH)


with BuildPart() as part_5:
    add(part_4.part)

    # 切除-拉伸3: cut by cut_extrude_3_tool
    add(cut_extrude_3_tool.part, mode=Mode.SUBTRACT)

    # 草图16 → 切除-拉伸4 (cut)
    with BuildSketch(Plane(origin=(-7.5, 0, 0), x_dir=(0, 0, -1), z_dir=(1, 0, 0))):
        with Locations(Location((-8, -18, 0), (0, 0, 90))):
            Circle(SKETCH_16_R)
    extrude(amount=-CUT_EXTRUDE_4_DEPTH, mode=Mode.SUBTRACT)


with BuildPart() as body_2_5:
    add(body_2_4.part)

    # 切除-拉伸3: cut by cut_extrude_3_tool
    add(cut_extrude_3_tool.part, mode=Mode.SUBTRACT)


with BuildPart() as cut_extrude_5_tool:
    # 草图17 → 切除-拉伸5 (new, two sides: drawn at the far end of the back side and taken through both)
    with BuildSketch(Plane.XY.offset(1.8).offset(-CUT_EXTRUDE_5_DEPTH_BACK)):
        with Locations((6.5, 9.5)):
            Circle(SKETCH_17_R)
    extrude(amount=CUT_EXTRUDE_5_DEPTH + CUT_EXTRUDE_5_DEPTH_BACK)


with BuildPart() as part_6:
    add(part_5.part)

    # 切除-拉伸5: cut by cut_extrude_5_tool
    add(cut_extrude_5_tool.part, mode=Mode.SUBTRACT)

    # 圆角1
    fillet_1_edges = [part_6.edges().sort_by_distance(p)[0] for p in [
        (-27.5, 3, 0),
        (0, 30, 0),
        (27.5, 10.2, 0),
        (27.5, -9.6, 8.25),
        (-7.5, -16.8, 0),
        (10, -9.6, 0),
        (-7.5, -9.6, 8.25),
        (-7.5, -30, 15.25),
        (-27.5, -30, 15.25),
        (-27.5, 30, 8.25),
        (27.5, 30, 8.25),
        (-17.5, -24, 0),
        (-7.5, -24, 7),
        (-27.5, -24, 7),
    ]]
    fillet(fillet_1_edges, radius=FILLET_1_R)


with BuildPart() as body_2_6:
    add(body_2_5.part)

    # 切除-拉伸5: cut by cut_extrude_5_tool
    add(cut_extrude_5_tool.part, mode=Mode.SUBTRACT)

    # 圆角2
    fillet_2_edges = [body_2_6.edges().sort_by_distance(p)[0] for p in [
        (-27.5, 30, 18),
        (27.5, 30, 18),
        (27.5, -9.6, 18),
        (-7.5, -9.6, 18),
        (-7.5, -30, 18),
        (-27.5, -30, 18),
    ]]
    fillet(fillet_2_edges, radius=FILLET_2_R)

    # 草图20 → Ø4.0 (4) 直径孔1 (revolve, cut)
    with BuildSketch(Plane(origin=(24, 21.5, 16.5), x_dir=(0, 1, 0), z_dir=(1, 0, 0))):
        with Locations((1, 1.5)):
            Rectangle(SKETCH_20_W, SKETCH_20_H)
    hole_wizard_4_0_4_1 = revolve(axis=Axis((24, 21.5, 10.15), (0, 0, 1)), mode=Mode.SUBTRACT)

    # Ø4.0 (4) 直径孔1 at 2: Ø4.0 (4) 直径孔1 ×2
    with Locations(*[(0, -i * HOLE_WIZARD_4_0_4_1_AT_2_PITCH, 0) for i in range(1, HOLE_WIZARD_4_0_4_1_AT_2_COUNT)]):
        add(hole_wizard_4_0_4_1, mode=Mode.SUBTRACT)

    # Ø4.0 (4) 直径孔1 at 3: Ø4.0 (4) 直径孔1 ×2
    with Locations(*[Vector(-0.6305926250944656, -0.7761140001162656, 0) * (i * HOLE_WIZARD_4_0_4_1_AT_3_PITCH) for i in range(1, HOLE_WIZARD_4_0_4_1_AT_3_COUNT)]):
        add(hole_wizard_4_0_4_1, mode=Mode.SUBTRACT)

    # Ø4.0 (4) 直径孔1 at 4: Ø4.0 (4) 直径孔1 ×2
    with Locations(*[(-i * HOLE_WIZARD_4_0_4_1_AT_4_PITCH, 0, 0) for i in range(1, HOLE_WIZARD_4_0_4_1_AT_4_COUNT)]):
        add(hole_wizard_4_0_4_1, mode=Mode.SUBTRACT)

    # Ø2.7 (2.7) 直径孔1 (through all)
    with Locations(Plane.XY.offset(17.7)):
        with Locations((24, 26.5), (24, -1), (-24, 26.5), (-22.5, -26.5)):
            Hole(HOLE_WIZARD_2_7_2_7_1_D / 2)


solid = body_2_6.part
